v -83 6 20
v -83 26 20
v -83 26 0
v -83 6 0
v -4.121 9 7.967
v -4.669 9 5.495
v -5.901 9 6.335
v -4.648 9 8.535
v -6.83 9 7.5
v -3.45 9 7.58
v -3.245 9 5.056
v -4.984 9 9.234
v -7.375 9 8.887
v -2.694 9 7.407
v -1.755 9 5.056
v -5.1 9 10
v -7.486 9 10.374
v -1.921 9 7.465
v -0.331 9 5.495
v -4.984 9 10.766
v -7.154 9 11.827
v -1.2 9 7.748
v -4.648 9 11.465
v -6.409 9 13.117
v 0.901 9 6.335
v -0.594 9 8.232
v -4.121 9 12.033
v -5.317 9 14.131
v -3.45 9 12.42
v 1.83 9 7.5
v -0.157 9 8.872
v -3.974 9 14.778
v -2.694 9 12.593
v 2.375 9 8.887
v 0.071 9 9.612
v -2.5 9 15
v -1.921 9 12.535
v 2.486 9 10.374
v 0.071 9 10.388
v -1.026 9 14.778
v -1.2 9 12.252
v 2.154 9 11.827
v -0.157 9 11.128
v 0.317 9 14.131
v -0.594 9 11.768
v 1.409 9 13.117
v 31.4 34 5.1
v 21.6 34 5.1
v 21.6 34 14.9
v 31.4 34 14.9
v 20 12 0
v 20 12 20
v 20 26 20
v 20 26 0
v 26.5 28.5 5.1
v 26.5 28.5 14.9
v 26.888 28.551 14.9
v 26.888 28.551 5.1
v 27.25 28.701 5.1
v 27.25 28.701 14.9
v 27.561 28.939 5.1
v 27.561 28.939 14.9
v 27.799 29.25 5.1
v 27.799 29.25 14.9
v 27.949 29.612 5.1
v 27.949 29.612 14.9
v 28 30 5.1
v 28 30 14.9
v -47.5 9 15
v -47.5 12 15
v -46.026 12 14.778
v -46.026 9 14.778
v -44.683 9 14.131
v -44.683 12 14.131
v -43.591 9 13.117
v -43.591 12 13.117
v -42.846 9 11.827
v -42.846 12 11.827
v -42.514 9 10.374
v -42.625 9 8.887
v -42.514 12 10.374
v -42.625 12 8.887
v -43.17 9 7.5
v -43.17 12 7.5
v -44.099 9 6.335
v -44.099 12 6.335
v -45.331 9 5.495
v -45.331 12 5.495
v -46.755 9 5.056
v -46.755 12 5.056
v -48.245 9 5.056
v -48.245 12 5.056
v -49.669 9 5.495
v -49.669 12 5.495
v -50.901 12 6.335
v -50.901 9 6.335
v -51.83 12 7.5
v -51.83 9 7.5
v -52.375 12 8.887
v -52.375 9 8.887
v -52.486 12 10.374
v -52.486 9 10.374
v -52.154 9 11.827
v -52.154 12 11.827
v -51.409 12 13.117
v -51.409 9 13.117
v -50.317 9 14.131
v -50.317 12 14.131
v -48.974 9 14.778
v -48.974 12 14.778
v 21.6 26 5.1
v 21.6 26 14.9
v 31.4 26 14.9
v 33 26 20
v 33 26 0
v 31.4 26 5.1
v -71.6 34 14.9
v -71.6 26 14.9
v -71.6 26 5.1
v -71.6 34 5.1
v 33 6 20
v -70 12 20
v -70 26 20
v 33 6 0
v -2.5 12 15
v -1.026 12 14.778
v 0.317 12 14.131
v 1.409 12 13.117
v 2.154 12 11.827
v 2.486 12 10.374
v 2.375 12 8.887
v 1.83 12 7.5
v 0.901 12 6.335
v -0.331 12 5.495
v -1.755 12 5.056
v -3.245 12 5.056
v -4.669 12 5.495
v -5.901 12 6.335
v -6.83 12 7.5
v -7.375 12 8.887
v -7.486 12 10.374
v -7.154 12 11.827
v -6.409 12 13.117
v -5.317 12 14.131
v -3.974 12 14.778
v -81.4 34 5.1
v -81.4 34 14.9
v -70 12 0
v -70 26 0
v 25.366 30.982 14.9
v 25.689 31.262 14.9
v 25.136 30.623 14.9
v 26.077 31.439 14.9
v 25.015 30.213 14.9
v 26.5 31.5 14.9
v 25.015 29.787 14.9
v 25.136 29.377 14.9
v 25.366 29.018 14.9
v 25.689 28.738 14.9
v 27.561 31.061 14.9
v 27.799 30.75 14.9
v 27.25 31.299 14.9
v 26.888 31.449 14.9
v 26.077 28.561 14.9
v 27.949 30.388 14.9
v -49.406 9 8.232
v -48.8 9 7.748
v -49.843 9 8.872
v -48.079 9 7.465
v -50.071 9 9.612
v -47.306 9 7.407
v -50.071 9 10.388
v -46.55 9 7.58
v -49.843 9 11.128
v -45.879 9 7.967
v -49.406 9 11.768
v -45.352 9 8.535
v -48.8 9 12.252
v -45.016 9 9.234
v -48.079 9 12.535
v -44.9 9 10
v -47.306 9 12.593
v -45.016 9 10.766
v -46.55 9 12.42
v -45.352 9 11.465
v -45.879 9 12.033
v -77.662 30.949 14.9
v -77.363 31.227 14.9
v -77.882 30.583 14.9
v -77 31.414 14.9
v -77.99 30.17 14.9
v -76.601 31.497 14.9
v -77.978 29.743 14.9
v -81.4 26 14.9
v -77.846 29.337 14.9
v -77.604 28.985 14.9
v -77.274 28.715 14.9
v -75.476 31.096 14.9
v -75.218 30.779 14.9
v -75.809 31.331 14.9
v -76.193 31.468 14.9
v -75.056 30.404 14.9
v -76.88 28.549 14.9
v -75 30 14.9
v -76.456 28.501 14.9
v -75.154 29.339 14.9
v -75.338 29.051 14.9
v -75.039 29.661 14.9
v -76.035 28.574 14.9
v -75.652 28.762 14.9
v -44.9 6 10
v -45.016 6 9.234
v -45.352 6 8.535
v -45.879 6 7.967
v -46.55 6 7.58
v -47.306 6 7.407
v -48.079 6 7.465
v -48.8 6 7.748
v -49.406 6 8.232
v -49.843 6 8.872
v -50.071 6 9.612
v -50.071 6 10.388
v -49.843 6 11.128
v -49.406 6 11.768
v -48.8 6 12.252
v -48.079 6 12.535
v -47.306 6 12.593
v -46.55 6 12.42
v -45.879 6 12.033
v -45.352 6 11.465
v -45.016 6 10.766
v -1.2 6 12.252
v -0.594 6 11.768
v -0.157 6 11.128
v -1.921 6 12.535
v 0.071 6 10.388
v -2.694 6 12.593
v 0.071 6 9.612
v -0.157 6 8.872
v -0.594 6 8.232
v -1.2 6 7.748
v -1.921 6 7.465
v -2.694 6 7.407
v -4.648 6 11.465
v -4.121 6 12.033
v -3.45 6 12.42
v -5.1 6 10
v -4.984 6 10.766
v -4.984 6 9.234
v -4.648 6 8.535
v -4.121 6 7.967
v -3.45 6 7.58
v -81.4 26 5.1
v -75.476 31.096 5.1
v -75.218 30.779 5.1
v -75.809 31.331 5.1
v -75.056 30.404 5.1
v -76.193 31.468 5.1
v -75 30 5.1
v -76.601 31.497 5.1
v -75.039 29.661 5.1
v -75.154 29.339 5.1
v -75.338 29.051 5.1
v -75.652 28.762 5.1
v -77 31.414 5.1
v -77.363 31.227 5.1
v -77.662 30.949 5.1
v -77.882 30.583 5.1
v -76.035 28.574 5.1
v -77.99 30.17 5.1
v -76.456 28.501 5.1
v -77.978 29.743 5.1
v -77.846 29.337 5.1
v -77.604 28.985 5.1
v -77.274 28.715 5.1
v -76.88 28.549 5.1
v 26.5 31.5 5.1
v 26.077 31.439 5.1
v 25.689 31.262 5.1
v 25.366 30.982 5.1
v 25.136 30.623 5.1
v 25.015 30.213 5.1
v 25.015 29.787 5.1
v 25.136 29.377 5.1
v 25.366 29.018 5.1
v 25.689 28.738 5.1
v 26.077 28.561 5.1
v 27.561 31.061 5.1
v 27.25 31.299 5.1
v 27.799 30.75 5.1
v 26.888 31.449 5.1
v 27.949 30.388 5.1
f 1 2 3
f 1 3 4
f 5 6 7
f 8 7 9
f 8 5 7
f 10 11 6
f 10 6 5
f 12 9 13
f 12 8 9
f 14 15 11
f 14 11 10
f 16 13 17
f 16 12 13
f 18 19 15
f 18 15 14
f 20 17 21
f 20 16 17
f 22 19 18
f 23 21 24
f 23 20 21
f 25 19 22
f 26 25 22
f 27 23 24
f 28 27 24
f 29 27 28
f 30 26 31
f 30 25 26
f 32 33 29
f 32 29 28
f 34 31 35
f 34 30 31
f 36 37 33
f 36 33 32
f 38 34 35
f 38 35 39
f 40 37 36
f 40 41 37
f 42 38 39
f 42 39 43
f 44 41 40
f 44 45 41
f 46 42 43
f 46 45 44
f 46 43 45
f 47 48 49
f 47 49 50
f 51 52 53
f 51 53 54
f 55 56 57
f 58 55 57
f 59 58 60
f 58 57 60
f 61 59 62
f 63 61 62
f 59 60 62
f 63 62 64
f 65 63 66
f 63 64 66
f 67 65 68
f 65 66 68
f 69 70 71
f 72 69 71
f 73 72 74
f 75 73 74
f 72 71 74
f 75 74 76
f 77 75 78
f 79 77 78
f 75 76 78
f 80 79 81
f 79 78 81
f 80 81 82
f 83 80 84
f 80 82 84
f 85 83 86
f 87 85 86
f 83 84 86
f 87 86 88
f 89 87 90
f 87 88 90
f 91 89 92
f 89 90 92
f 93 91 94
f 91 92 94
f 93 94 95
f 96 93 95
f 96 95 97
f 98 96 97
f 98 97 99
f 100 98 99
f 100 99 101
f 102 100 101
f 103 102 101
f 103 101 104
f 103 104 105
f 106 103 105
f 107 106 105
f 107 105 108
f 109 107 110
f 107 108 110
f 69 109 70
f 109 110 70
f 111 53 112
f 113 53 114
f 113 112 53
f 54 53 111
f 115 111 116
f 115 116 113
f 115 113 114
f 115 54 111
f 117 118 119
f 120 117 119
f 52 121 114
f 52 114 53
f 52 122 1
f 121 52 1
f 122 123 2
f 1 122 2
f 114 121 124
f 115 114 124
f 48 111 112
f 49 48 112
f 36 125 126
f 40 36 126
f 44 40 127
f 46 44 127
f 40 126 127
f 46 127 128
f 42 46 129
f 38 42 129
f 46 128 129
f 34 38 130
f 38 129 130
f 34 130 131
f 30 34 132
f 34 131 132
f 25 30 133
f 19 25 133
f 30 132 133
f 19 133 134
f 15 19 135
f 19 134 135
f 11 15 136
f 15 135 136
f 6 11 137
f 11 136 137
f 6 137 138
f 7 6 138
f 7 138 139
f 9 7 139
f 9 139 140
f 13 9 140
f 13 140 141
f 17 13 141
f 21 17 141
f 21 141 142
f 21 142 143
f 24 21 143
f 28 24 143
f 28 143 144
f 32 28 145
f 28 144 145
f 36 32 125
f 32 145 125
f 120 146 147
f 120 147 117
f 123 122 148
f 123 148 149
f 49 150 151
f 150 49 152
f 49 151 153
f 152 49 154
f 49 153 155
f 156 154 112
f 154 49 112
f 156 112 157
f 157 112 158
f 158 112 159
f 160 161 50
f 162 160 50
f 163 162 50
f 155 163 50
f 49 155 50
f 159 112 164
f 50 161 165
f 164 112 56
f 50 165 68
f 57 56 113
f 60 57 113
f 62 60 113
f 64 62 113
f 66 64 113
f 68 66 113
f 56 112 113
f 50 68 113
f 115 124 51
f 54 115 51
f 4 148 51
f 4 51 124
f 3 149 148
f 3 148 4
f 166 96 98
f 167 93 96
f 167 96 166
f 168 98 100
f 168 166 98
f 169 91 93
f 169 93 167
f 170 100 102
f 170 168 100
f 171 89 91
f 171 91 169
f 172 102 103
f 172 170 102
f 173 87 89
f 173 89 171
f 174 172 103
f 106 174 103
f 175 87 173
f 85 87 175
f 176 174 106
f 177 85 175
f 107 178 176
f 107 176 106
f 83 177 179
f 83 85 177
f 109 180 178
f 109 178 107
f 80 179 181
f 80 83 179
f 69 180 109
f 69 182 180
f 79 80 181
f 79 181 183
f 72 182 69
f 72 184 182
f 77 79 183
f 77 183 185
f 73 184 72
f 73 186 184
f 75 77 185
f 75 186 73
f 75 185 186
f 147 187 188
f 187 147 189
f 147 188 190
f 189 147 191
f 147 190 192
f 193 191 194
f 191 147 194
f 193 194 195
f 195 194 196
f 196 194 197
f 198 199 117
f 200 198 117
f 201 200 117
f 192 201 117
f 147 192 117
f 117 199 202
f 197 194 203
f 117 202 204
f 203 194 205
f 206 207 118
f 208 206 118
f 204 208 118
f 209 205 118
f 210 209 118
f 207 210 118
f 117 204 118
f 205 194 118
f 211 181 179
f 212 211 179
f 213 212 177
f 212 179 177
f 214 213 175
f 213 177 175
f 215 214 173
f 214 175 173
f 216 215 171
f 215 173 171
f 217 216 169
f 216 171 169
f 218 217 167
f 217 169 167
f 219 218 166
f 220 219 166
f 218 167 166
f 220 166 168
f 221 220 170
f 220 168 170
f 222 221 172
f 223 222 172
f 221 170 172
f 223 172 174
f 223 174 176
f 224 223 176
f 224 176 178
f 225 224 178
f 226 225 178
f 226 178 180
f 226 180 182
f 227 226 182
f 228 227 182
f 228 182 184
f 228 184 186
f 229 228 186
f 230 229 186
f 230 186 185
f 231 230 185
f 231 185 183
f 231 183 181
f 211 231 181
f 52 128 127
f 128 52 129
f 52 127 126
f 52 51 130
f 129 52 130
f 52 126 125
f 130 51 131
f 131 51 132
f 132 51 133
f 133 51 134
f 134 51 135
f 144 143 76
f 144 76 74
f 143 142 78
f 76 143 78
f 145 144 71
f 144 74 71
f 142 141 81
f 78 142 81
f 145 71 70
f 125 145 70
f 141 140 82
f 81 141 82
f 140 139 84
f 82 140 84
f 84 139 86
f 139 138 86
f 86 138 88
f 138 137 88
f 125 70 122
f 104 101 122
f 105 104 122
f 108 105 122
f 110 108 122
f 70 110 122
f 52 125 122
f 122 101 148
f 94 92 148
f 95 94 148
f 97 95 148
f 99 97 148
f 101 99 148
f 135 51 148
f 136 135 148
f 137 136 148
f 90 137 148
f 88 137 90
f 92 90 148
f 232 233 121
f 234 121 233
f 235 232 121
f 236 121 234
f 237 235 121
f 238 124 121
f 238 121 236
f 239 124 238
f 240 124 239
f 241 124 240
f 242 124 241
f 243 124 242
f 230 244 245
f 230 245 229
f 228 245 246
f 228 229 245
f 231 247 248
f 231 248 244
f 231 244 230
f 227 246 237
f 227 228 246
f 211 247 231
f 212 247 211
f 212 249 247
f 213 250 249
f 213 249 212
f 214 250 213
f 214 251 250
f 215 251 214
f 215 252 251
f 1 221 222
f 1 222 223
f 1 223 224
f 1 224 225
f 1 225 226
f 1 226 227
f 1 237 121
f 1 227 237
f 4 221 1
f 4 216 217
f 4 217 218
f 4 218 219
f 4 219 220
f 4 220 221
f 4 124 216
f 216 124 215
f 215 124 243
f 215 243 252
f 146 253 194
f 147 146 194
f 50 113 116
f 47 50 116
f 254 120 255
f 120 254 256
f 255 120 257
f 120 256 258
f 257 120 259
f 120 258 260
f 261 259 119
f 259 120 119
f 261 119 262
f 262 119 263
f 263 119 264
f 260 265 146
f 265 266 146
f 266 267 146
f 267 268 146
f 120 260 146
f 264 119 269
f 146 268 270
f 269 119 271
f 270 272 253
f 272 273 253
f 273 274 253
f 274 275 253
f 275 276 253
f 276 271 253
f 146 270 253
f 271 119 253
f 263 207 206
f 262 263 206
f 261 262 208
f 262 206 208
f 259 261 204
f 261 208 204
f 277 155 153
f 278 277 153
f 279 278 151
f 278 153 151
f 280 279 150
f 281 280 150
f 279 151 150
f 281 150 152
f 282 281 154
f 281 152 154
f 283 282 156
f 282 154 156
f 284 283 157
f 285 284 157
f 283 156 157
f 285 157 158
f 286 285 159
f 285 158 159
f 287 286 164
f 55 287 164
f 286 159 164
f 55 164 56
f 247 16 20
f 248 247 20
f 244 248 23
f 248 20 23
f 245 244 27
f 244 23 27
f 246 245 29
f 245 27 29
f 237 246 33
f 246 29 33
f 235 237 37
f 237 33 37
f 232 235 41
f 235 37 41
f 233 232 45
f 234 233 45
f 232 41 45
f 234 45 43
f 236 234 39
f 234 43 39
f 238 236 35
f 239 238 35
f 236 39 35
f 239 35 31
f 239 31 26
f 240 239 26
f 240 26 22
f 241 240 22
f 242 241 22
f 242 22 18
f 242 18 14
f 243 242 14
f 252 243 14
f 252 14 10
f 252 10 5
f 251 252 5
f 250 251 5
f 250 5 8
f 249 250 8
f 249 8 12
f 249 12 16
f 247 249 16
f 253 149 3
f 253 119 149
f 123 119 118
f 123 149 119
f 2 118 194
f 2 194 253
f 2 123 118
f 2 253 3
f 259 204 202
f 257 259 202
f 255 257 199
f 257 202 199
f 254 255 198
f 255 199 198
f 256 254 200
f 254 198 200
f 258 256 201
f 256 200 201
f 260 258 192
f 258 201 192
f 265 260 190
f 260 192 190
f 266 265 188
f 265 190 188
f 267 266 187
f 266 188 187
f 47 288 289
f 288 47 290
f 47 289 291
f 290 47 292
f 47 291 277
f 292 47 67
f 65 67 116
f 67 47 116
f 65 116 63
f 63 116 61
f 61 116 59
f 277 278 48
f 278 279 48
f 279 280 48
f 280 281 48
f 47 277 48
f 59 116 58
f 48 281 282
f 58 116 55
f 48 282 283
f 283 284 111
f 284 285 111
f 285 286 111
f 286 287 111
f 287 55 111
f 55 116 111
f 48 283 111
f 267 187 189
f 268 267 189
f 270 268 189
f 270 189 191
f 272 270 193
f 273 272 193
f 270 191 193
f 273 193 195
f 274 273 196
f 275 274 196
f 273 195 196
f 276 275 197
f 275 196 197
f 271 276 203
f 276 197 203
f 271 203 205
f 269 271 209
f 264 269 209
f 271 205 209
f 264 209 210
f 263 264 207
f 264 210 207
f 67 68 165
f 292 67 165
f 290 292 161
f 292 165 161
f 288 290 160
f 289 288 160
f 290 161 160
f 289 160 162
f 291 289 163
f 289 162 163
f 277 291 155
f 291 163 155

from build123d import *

# Parameters (mm, degrees)
SKETCH_1_W           = 40
SKETCH_1_H           = 20
EXTRUDE_1_DEPTH      = 6
SKETCH_5_W           = 7
SKETCH_5_H           = 20
CUT_EXTRUDE_3_DEPTH  = 6
SKETCH_6_W           = 13
SKETCH_6_H           = 20
EXTRUDE_2_DEPTH      = 20
EXTRUDE_3_DEPTH      = 8
CUT_EXTRUDE_4_DEPTH  = 10
EXTRUDE_4_DEPTH      = 20
EXTRUDE_5_DEPTH      = 8
CUT_EXTRUDE_5_DEPTH  = 10
CUT_EXTRUDE_6_DEPTH  = 3
SKETCH_16_R          = 2.6
CUT_EXTRUDE_7_DEPTH  = 3
CUT_EXTRUDE_8_DEPTH  = 20
SKETCH_19_W          = 90
SKETCH_19_H          = 6
EXTRUDE_6_DEPTH      = 20
CUT_EXTRUDE_9_DEPTH  = 20
SKETCH_21_R          = 5
CUT_EXTRUDE_10_DEPTH = 3


with BuildPart() as part:
    # 草图1 → 凸台-拉伸1 (new body)
    with BuildSketch(Plane(origin=(0, 0, 0), x_dir=(1, 0, 0), z_dir=(0, 1, 0))):
        with Locations((20, -10)):
            Rectangle(SKETCH_1_W, SKETCH_1_H)
    extrude(amount=EXTRUDE_1_DEPTH)

    # 草图5 → 切除-拉伸3 (cut)
    with BuildSketch(Plane(origin=(0, 6, 0), x_dir=(1, 0, 0), z_dir=(0, 1, 0))):
        with Locations((36.5, -10)):
            Rectangle(SKETCH_5_W, SKETCH_5_H)
    extrude(amount=-CUT_EXTRUDE_3_DEPTH, mode=Mode.SUBTRACT)

    # 草图6 → 凸台-拉伸2 (add)
    # profile 1 of 3: a face of its own
    with BuildSketch(Plane(origin=(0, 6, 0), x_dir=(1, 0, 0), z_dir=(0, 1, 0))):
        with Locations((26.5, -10)):
            Rectangle(SKETCH_6_W, SKETCH_6_H)
        Polygon((31.5, -5), (31.5, -10), (31.5, -15), (21.5, -15), (21.5, -10), (21.5, -5), align=None, mode=Mode.SUBTRACT)
    # profile 2 of 3: a face of its own
    with BuildSketch(Plane(origin=(0, 6, 0), x_dir=(1, 0, 0), z_dir=(0, 1, 0))):
        Polygon((21.5, -10), (26.5, -10), (31.5, -10), (31.5, -5), (21.5, -5), align=None)
    # profile 3 of 3: a face of its own
    with BuildSketch(Plane(origin=(0, 6, 0), x_dir=(1, 0, 0), z_dir=(0, 1, 0))):
        Polygon((31.5, -10), (26.5, -10), (21.5, -10), (21.5, -15), (31.5, -15), align=None)
    extrude(amount=EXTRUDE_2_DEPTH)

    # 草图8 → 凸台-拉伸3 (add)
    with BuildSketch(Plane(origin=(0, 26, 0), x_dir=(1, 0, 0), z_dir=(0, 1, 0))):
        Polygon((31.4, -5.1), (23.315, -5.1), (26.5, -10), (31.4, -10), align=None)
        Polygon((26.5, -10), (23.315, -5.1), (21.6, -5.1), (21.6, -10), align=None)
        Polygon((29.685, -14.9), (26.5, -10), (21.6, -10), (21.6, -14.9), align=None)
        Polygon((31.4, -10), (26.5, -10), (29.685, -14.9), (31.4, -14.9), align=None)
    extrude(amount=EXTRUDE_3_DEPTH)

    # 草图9 → 切除-拉伸4 (cut)
    with BuildSketch(Plane.XY.offset(14.9)):
        with BuildLine():
            ThreePointArc((28, 30), (27.560660172, 31.060660172), (26.5, 31.5))
            Line((26.5, 31.5), (26.5, 28.5))
            ThreePointArc((26.5, 28.5), (27.560660172, 28.939339828), (28, 30))
        make_face()
        with BuildLine():
            Line((26.5, 28.5), (26.5, 31.5))
            ThreePointArc((26.5, 31.5), (25, 30), (26.5, 28.5))
        make_face()
    extrude(amount=-CUT_EXTRUDE_4_DEPTH, mode=Mode.SUBTRACT)

    # 草图10 → 凸台-拉伸4 (add)
    with BuildSketch(Plane.XY.offset(20)):
        Polygon((0, 0), (0, 6), (-70, 6), (-70, 26), (-83, 26), (-83, 0), align=None)
    extrude(amount=-EXTRUDE_4_DEPTH)

    # 草图12 → 凸台-拉伸5 (add)
    with BuildSketch(Plane(origin=(0, 26, 0), x_dir=(1, 0, 0), z_dir=(0, 1, 0))):
        Polygon((-71.6, -5.1), (-79.685, -5.1), (-76.5, -10), (-71.6, -10), align=None)
        Polygon((-76.5, -10), (-79.685, -5.1), (-81.4, -5.1), (-81.4, -10), align=None)
        Polygon((-73.315, -14.9), (-76.5, -10), (-81.4, -10), (-81.4, -14.9), align=None)
        Polygon((-71.6, -10), (-76.5, -10), (-73.315, -14.9), (-71.6, -14.9), align=None)
    extrude(amount=EXTRUDE_5_DEPTH)

    # 草图13 → 切除-拉伸5 (cut)
    with BuildSketch(Plane.XY.offset(14.9)):
        with BuildLine():
            ThreePointArc((-75, 30), (-75.996506058, 31.412973407), (-77.6619918, 30.948564735))
            Line((-77.6619918, 30.948564735), (-75.3380082, 29.051435265))
            ThreePointArc((-75.3380082, 29.051435265), (-75.087026593, 29.496506058), (-75, 30))
        make_face()
        with BuildLine():
            Line((-75.3380082, 29.051435265), (-77.6619918, 30.948564735))
            ThreePointArc((-77.6619918, 30.948564735), (-77.448564735, 28.8380082), (-75.3380082, 29.051435265))
        make_face()
    extrude(amount=-CUT_EXTRUDE_5_DEPTH, mode=Mode.SUBTRACT)

    # 草图15 → 切除-拉伸6 (cut)
    with BuildSketch(Plane(origin=(0, 6, 0), x_dir=(1, 0, 0), z_dir=(0, 1, 0))):
        with BuildLine():
            ThreePointArc((-52.5, -10), (-47.5, -15), (-42.5, -10))
            Line((-42.5, -10), (-52.5, -10))
        make_face()
        with BuildLine():
            Line((-52.5, -10), (-42.5, -10))
            ThreePointArc((-42.5, -10), (-47.5, -5), (-52.5, -10))
        make_face()
        with BuildLine():
            ThreePointArc((2.5, -10), (-2.5, -5), (-7.5, -10))
            Line((-7.5, -10), (2.5, -10))
        make_face()
        with BuildLine():
            Line((2.5, -10), (-7.5, -10))
            ThreePointArc((-7.5, -10), (-2.5, -15), (2.5, -10))
        make_face()
    extrude(amount=-CUT_EXTRUDE_6_DEPTH, mode=Mode.SUBTRACT)

    # 草图16 → 切除-拉伸7 (cut)
    with BuildSketch(Plane(origin=(0, 3, 0), x_dir=(1, 0, 0), z_dir=(0, 1, 0))):
        with Locations(Location((-47.5, -10, 0), (0, 0, 270))):
            Circle(SKETCH_16_R)
        with Locations(Location((-2.5, -10, 0), (0, 0, 270))):
            Circle(SKETCH_16_R)
    extrude(amount=-CUT_EXTRUDE_7_DEPTH, mode=Mode.SUBTRACT)

    # 草图18 → 切除-拉伸8 (cut)
    with BuildSketch(Plane(origin=(0, 0, 0), x_dir=(-1, 0, 0), z_dir=(0, 0, -1))):
        Polygon((-20, 6), (-33, 6), (-33, 0), (83, 0), (83, 6), (70, 6), align=None)
    extrude(amount=-CUT_EXTRUDE_8_DEPTH, mode=Mode.SUBTRACT)


with BuildPart() as cut_extrude_8_piece_1:
    # of the separate pieces the step leaves, piece 1, a body of its own (cut_extrude_8_pieces)
    add(part.part.solids().sort_by_distance((-70, 6, 0))[0])



with BuildPart() as cut_extrude_8_piece_2:
    # of the separate pieces the step leaves, piece 2, a body of its own (cut_extrude_8_pieces)
    add(part.part.solids().sort_by_distance((33, 26, 0))[0])


with BuildPart() as cut_extrude_8_piece_1_1:
    add(cut_extrude_8_piece_1.part)

    add(cut_extrude_8_piece_2.part)  # 凸台-拉伸6 merges 切除-拉伸8 piece 2
    # 草图19 → 凸台-拉伸6 (add)
    with BuildSketch(Plane(origin=(0, 0, 0), x_dir=(-1, 0, 0), z_dir=(0, 0, -1))):
        with Locations((25, 9)):
            Rectangle(SKETCH_19_W, SKETCH_19_H)
    extrude(amount=-EXTRUDE_6_DEPTH)

    # 草图20 → 切除-拉伸9 (cut)
    with BuildSketch(Plane(origin=(0, 12, 0), x_dir=(1, 0, 0), z_dir=(0, 1, 0))):
        with BuildLine():
            ThreePointArc((-50.1, -10), (-47.5, -12.6), (-44.9, -10))
            Line((-44.9, -10), (-50.1, -10))
        make_face()
        with BuildLine():
            Line((-50.1, -10), (-44.9, -10))
            ThreePointArc((-44.9, -10), (-47.5, -7.4), (-50.1, -10))
        make_face()
        with BuildLine():
            ThreePointArc((0.1, -10), (-2.5, -7.4), (-5.1, -10))
            Line((-5.1, -10), (0.1, -10))
        make_face()
        with BuildLine():
            Line((0.1, -10), (-5.1, -10))
            ThreePointArc((-5.1, -10), (-2.5, -12.6), (0.1, -10))
        make_face()
    extrude(amount=-CUT_EXTRUDE_9_DEPTH, mode=Mode.SUBTRACT)

    # 草图21 → 切除-拉伸10 (cut)
    with BuildSketch(Plane(origin=(0, 12, 0), x_dir=(1, 0, 0), z_dir=(0, 1, 0))):
        with Locations(Location((-47.5, -10, 0), (0, 0, 270))):
            Circle(SKETCH_21_R)
        with Locations(Location((-2.5, -10, 0), (0, 0, 270))):
            Circle(SKETCH_21_R)
    extrude(amount=-CUT_EXTRUDE_10_DEPTH, mode=Mode.SUBTRACT)


solid = cut_extrude_8_piece_1_1.part
